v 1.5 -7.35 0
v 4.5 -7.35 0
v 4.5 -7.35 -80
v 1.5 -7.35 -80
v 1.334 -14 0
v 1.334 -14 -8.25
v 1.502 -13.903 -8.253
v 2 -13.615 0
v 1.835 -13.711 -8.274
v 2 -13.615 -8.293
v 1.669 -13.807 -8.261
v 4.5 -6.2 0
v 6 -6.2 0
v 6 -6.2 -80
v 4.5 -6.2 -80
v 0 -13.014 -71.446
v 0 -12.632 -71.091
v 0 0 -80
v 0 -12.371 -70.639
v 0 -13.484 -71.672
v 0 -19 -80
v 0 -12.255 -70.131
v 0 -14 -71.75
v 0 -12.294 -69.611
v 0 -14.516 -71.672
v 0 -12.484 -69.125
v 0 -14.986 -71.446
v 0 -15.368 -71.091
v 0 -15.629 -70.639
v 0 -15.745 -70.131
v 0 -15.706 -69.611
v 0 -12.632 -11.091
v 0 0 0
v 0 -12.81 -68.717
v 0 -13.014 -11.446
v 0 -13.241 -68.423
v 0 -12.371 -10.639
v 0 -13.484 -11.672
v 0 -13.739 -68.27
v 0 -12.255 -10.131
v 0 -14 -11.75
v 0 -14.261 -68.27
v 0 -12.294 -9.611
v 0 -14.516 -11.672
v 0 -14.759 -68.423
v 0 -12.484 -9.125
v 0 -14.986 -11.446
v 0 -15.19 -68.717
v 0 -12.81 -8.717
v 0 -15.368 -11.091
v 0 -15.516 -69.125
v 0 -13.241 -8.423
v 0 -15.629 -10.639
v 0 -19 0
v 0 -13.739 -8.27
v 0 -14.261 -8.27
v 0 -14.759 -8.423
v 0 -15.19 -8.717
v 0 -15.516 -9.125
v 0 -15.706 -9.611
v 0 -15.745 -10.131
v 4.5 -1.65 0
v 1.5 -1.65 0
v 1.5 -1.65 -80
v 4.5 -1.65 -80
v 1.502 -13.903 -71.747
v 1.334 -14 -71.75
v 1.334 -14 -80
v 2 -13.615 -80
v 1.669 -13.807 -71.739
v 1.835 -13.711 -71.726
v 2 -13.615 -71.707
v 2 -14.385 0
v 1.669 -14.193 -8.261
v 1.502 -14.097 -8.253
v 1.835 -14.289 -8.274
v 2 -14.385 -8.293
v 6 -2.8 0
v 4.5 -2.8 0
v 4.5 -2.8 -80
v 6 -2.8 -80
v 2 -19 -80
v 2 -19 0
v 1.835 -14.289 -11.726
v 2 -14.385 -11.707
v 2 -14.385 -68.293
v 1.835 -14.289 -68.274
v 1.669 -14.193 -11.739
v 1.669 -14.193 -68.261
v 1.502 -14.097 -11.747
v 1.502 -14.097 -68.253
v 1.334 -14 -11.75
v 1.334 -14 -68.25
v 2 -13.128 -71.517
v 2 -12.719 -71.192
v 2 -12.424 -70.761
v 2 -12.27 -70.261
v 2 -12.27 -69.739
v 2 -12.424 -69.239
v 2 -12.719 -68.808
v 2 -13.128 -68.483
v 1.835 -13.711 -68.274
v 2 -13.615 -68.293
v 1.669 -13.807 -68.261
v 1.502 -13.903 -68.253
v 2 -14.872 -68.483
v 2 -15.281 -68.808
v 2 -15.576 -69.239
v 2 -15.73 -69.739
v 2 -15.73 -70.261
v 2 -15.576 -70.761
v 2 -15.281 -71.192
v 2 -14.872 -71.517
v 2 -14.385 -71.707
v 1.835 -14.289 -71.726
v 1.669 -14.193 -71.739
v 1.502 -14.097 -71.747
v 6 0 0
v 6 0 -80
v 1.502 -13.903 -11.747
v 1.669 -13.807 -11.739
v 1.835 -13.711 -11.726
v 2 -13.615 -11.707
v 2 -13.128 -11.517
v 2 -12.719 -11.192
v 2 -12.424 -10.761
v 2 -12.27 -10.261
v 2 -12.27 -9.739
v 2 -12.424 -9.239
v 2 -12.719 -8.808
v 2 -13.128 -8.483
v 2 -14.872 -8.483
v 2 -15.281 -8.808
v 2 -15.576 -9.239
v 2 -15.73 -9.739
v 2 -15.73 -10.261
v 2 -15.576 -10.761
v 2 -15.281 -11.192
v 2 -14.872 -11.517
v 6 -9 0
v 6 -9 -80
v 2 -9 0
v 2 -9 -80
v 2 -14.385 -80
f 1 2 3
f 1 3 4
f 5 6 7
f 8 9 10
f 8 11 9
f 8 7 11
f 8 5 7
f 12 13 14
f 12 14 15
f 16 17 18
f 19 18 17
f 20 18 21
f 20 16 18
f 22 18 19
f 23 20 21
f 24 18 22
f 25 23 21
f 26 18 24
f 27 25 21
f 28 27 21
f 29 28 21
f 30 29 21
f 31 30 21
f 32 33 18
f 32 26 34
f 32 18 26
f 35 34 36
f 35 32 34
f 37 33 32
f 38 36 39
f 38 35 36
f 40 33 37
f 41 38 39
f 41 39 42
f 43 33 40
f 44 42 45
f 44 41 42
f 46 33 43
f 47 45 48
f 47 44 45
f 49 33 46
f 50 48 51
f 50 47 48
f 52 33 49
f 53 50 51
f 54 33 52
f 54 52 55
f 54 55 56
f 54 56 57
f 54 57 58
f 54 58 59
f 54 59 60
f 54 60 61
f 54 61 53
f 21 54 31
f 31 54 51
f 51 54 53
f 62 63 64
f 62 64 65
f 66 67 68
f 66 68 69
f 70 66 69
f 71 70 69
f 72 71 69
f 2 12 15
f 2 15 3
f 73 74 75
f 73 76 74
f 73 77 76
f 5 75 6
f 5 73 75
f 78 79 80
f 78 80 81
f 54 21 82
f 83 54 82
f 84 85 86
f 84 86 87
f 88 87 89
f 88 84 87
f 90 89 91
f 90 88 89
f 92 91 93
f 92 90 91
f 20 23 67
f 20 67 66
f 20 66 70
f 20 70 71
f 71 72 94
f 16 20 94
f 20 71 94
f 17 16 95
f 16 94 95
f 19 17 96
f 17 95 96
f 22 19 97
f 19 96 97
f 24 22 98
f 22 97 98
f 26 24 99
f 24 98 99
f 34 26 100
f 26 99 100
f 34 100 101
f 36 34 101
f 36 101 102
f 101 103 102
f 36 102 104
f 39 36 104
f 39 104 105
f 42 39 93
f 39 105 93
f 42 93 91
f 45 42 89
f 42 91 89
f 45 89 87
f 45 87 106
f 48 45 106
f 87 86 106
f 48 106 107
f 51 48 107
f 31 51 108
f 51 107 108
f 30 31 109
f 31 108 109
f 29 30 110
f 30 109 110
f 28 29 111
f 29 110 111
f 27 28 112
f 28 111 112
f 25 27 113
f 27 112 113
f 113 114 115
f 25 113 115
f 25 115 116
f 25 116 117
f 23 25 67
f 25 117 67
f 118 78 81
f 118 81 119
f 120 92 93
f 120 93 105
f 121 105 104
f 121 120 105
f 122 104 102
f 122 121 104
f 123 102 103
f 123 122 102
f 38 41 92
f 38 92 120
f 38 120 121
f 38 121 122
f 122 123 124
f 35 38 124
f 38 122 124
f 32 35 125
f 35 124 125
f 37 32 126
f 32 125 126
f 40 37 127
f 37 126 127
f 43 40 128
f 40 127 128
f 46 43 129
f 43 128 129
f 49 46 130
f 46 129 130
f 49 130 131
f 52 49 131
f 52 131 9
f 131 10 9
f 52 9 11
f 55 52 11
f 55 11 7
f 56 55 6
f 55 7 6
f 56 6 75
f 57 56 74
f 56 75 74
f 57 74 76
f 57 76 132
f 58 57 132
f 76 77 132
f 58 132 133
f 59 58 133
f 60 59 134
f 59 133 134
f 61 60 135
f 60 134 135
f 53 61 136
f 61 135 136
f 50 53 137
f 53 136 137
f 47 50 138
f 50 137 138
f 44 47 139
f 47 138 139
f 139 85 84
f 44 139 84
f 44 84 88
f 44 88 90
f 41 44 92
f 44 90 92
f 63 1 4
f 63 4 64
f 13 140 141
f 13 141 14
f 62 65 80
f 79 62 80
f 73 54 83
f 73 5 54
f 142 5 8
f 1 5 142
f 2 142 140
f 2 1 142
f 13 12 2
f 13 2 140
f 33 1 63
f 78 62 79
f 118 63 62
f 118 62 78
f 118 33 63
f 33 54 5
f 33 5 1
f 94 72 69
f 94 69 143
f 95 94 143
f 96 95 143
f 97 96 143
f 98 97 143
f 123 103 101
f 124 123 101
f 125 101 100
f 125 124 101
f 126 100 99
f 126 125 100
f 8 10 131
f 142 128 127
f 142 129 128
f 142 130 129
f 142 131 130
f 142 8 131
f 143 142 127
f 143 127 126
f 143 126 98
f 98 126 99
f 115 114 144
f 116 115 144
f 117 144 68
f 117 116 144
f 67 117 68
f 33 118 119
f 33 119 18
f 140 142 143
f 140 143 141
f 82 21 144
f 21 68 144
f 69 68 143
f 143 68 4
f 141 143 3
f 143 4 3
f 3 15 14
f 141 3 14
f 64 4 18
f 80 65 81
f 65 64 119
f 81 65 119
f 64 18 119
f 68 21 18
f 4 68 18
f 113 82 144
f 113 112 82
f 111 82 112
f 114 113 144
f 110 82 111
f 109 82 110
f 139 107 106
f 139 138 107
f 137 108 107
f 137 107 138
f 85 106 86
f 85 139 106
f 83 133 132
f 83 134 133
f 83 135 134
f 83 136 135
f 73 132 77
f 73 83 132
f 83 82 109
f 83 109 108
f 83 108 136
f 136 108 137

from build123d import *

# Parameters (mm, degrees)
BOSS_EXTRUDE1_DEPTH        = 80
F_3_5_3_5_DIAMETER_HOLE1_D = 3.5


with BuildPart() as part:
    # Sketch1 → Boss-Extrude1 (new body)
    with BuildSketch(Plane.XY):
        Polygon((6, -2.8), (6, 0), (0, 0), (0, -19), (2, -19), (2, -14.384515279), (1.334, -14), (2, -13.615484721), (2, -9), (6, -9), (6, -6.2), (4.5, -6.2), (4.5, -7.35), (1.5, -7.35), (1.5, -1.65), (4.5, -1.65), (4.5, -2.8), align=None)
    extrude(amount=-BOSS_EXTRUDE1_DEPTH)

    # Ø3.5 (3.5) Diameter Hole1 (through all)
    with Locations(Plane.ZY):
        with Locations((-10, -14), (-70, -14)):
            Hole(F_3_5_3_5_DIAMETER_HOLE1_D / 2)


solid = part.part
